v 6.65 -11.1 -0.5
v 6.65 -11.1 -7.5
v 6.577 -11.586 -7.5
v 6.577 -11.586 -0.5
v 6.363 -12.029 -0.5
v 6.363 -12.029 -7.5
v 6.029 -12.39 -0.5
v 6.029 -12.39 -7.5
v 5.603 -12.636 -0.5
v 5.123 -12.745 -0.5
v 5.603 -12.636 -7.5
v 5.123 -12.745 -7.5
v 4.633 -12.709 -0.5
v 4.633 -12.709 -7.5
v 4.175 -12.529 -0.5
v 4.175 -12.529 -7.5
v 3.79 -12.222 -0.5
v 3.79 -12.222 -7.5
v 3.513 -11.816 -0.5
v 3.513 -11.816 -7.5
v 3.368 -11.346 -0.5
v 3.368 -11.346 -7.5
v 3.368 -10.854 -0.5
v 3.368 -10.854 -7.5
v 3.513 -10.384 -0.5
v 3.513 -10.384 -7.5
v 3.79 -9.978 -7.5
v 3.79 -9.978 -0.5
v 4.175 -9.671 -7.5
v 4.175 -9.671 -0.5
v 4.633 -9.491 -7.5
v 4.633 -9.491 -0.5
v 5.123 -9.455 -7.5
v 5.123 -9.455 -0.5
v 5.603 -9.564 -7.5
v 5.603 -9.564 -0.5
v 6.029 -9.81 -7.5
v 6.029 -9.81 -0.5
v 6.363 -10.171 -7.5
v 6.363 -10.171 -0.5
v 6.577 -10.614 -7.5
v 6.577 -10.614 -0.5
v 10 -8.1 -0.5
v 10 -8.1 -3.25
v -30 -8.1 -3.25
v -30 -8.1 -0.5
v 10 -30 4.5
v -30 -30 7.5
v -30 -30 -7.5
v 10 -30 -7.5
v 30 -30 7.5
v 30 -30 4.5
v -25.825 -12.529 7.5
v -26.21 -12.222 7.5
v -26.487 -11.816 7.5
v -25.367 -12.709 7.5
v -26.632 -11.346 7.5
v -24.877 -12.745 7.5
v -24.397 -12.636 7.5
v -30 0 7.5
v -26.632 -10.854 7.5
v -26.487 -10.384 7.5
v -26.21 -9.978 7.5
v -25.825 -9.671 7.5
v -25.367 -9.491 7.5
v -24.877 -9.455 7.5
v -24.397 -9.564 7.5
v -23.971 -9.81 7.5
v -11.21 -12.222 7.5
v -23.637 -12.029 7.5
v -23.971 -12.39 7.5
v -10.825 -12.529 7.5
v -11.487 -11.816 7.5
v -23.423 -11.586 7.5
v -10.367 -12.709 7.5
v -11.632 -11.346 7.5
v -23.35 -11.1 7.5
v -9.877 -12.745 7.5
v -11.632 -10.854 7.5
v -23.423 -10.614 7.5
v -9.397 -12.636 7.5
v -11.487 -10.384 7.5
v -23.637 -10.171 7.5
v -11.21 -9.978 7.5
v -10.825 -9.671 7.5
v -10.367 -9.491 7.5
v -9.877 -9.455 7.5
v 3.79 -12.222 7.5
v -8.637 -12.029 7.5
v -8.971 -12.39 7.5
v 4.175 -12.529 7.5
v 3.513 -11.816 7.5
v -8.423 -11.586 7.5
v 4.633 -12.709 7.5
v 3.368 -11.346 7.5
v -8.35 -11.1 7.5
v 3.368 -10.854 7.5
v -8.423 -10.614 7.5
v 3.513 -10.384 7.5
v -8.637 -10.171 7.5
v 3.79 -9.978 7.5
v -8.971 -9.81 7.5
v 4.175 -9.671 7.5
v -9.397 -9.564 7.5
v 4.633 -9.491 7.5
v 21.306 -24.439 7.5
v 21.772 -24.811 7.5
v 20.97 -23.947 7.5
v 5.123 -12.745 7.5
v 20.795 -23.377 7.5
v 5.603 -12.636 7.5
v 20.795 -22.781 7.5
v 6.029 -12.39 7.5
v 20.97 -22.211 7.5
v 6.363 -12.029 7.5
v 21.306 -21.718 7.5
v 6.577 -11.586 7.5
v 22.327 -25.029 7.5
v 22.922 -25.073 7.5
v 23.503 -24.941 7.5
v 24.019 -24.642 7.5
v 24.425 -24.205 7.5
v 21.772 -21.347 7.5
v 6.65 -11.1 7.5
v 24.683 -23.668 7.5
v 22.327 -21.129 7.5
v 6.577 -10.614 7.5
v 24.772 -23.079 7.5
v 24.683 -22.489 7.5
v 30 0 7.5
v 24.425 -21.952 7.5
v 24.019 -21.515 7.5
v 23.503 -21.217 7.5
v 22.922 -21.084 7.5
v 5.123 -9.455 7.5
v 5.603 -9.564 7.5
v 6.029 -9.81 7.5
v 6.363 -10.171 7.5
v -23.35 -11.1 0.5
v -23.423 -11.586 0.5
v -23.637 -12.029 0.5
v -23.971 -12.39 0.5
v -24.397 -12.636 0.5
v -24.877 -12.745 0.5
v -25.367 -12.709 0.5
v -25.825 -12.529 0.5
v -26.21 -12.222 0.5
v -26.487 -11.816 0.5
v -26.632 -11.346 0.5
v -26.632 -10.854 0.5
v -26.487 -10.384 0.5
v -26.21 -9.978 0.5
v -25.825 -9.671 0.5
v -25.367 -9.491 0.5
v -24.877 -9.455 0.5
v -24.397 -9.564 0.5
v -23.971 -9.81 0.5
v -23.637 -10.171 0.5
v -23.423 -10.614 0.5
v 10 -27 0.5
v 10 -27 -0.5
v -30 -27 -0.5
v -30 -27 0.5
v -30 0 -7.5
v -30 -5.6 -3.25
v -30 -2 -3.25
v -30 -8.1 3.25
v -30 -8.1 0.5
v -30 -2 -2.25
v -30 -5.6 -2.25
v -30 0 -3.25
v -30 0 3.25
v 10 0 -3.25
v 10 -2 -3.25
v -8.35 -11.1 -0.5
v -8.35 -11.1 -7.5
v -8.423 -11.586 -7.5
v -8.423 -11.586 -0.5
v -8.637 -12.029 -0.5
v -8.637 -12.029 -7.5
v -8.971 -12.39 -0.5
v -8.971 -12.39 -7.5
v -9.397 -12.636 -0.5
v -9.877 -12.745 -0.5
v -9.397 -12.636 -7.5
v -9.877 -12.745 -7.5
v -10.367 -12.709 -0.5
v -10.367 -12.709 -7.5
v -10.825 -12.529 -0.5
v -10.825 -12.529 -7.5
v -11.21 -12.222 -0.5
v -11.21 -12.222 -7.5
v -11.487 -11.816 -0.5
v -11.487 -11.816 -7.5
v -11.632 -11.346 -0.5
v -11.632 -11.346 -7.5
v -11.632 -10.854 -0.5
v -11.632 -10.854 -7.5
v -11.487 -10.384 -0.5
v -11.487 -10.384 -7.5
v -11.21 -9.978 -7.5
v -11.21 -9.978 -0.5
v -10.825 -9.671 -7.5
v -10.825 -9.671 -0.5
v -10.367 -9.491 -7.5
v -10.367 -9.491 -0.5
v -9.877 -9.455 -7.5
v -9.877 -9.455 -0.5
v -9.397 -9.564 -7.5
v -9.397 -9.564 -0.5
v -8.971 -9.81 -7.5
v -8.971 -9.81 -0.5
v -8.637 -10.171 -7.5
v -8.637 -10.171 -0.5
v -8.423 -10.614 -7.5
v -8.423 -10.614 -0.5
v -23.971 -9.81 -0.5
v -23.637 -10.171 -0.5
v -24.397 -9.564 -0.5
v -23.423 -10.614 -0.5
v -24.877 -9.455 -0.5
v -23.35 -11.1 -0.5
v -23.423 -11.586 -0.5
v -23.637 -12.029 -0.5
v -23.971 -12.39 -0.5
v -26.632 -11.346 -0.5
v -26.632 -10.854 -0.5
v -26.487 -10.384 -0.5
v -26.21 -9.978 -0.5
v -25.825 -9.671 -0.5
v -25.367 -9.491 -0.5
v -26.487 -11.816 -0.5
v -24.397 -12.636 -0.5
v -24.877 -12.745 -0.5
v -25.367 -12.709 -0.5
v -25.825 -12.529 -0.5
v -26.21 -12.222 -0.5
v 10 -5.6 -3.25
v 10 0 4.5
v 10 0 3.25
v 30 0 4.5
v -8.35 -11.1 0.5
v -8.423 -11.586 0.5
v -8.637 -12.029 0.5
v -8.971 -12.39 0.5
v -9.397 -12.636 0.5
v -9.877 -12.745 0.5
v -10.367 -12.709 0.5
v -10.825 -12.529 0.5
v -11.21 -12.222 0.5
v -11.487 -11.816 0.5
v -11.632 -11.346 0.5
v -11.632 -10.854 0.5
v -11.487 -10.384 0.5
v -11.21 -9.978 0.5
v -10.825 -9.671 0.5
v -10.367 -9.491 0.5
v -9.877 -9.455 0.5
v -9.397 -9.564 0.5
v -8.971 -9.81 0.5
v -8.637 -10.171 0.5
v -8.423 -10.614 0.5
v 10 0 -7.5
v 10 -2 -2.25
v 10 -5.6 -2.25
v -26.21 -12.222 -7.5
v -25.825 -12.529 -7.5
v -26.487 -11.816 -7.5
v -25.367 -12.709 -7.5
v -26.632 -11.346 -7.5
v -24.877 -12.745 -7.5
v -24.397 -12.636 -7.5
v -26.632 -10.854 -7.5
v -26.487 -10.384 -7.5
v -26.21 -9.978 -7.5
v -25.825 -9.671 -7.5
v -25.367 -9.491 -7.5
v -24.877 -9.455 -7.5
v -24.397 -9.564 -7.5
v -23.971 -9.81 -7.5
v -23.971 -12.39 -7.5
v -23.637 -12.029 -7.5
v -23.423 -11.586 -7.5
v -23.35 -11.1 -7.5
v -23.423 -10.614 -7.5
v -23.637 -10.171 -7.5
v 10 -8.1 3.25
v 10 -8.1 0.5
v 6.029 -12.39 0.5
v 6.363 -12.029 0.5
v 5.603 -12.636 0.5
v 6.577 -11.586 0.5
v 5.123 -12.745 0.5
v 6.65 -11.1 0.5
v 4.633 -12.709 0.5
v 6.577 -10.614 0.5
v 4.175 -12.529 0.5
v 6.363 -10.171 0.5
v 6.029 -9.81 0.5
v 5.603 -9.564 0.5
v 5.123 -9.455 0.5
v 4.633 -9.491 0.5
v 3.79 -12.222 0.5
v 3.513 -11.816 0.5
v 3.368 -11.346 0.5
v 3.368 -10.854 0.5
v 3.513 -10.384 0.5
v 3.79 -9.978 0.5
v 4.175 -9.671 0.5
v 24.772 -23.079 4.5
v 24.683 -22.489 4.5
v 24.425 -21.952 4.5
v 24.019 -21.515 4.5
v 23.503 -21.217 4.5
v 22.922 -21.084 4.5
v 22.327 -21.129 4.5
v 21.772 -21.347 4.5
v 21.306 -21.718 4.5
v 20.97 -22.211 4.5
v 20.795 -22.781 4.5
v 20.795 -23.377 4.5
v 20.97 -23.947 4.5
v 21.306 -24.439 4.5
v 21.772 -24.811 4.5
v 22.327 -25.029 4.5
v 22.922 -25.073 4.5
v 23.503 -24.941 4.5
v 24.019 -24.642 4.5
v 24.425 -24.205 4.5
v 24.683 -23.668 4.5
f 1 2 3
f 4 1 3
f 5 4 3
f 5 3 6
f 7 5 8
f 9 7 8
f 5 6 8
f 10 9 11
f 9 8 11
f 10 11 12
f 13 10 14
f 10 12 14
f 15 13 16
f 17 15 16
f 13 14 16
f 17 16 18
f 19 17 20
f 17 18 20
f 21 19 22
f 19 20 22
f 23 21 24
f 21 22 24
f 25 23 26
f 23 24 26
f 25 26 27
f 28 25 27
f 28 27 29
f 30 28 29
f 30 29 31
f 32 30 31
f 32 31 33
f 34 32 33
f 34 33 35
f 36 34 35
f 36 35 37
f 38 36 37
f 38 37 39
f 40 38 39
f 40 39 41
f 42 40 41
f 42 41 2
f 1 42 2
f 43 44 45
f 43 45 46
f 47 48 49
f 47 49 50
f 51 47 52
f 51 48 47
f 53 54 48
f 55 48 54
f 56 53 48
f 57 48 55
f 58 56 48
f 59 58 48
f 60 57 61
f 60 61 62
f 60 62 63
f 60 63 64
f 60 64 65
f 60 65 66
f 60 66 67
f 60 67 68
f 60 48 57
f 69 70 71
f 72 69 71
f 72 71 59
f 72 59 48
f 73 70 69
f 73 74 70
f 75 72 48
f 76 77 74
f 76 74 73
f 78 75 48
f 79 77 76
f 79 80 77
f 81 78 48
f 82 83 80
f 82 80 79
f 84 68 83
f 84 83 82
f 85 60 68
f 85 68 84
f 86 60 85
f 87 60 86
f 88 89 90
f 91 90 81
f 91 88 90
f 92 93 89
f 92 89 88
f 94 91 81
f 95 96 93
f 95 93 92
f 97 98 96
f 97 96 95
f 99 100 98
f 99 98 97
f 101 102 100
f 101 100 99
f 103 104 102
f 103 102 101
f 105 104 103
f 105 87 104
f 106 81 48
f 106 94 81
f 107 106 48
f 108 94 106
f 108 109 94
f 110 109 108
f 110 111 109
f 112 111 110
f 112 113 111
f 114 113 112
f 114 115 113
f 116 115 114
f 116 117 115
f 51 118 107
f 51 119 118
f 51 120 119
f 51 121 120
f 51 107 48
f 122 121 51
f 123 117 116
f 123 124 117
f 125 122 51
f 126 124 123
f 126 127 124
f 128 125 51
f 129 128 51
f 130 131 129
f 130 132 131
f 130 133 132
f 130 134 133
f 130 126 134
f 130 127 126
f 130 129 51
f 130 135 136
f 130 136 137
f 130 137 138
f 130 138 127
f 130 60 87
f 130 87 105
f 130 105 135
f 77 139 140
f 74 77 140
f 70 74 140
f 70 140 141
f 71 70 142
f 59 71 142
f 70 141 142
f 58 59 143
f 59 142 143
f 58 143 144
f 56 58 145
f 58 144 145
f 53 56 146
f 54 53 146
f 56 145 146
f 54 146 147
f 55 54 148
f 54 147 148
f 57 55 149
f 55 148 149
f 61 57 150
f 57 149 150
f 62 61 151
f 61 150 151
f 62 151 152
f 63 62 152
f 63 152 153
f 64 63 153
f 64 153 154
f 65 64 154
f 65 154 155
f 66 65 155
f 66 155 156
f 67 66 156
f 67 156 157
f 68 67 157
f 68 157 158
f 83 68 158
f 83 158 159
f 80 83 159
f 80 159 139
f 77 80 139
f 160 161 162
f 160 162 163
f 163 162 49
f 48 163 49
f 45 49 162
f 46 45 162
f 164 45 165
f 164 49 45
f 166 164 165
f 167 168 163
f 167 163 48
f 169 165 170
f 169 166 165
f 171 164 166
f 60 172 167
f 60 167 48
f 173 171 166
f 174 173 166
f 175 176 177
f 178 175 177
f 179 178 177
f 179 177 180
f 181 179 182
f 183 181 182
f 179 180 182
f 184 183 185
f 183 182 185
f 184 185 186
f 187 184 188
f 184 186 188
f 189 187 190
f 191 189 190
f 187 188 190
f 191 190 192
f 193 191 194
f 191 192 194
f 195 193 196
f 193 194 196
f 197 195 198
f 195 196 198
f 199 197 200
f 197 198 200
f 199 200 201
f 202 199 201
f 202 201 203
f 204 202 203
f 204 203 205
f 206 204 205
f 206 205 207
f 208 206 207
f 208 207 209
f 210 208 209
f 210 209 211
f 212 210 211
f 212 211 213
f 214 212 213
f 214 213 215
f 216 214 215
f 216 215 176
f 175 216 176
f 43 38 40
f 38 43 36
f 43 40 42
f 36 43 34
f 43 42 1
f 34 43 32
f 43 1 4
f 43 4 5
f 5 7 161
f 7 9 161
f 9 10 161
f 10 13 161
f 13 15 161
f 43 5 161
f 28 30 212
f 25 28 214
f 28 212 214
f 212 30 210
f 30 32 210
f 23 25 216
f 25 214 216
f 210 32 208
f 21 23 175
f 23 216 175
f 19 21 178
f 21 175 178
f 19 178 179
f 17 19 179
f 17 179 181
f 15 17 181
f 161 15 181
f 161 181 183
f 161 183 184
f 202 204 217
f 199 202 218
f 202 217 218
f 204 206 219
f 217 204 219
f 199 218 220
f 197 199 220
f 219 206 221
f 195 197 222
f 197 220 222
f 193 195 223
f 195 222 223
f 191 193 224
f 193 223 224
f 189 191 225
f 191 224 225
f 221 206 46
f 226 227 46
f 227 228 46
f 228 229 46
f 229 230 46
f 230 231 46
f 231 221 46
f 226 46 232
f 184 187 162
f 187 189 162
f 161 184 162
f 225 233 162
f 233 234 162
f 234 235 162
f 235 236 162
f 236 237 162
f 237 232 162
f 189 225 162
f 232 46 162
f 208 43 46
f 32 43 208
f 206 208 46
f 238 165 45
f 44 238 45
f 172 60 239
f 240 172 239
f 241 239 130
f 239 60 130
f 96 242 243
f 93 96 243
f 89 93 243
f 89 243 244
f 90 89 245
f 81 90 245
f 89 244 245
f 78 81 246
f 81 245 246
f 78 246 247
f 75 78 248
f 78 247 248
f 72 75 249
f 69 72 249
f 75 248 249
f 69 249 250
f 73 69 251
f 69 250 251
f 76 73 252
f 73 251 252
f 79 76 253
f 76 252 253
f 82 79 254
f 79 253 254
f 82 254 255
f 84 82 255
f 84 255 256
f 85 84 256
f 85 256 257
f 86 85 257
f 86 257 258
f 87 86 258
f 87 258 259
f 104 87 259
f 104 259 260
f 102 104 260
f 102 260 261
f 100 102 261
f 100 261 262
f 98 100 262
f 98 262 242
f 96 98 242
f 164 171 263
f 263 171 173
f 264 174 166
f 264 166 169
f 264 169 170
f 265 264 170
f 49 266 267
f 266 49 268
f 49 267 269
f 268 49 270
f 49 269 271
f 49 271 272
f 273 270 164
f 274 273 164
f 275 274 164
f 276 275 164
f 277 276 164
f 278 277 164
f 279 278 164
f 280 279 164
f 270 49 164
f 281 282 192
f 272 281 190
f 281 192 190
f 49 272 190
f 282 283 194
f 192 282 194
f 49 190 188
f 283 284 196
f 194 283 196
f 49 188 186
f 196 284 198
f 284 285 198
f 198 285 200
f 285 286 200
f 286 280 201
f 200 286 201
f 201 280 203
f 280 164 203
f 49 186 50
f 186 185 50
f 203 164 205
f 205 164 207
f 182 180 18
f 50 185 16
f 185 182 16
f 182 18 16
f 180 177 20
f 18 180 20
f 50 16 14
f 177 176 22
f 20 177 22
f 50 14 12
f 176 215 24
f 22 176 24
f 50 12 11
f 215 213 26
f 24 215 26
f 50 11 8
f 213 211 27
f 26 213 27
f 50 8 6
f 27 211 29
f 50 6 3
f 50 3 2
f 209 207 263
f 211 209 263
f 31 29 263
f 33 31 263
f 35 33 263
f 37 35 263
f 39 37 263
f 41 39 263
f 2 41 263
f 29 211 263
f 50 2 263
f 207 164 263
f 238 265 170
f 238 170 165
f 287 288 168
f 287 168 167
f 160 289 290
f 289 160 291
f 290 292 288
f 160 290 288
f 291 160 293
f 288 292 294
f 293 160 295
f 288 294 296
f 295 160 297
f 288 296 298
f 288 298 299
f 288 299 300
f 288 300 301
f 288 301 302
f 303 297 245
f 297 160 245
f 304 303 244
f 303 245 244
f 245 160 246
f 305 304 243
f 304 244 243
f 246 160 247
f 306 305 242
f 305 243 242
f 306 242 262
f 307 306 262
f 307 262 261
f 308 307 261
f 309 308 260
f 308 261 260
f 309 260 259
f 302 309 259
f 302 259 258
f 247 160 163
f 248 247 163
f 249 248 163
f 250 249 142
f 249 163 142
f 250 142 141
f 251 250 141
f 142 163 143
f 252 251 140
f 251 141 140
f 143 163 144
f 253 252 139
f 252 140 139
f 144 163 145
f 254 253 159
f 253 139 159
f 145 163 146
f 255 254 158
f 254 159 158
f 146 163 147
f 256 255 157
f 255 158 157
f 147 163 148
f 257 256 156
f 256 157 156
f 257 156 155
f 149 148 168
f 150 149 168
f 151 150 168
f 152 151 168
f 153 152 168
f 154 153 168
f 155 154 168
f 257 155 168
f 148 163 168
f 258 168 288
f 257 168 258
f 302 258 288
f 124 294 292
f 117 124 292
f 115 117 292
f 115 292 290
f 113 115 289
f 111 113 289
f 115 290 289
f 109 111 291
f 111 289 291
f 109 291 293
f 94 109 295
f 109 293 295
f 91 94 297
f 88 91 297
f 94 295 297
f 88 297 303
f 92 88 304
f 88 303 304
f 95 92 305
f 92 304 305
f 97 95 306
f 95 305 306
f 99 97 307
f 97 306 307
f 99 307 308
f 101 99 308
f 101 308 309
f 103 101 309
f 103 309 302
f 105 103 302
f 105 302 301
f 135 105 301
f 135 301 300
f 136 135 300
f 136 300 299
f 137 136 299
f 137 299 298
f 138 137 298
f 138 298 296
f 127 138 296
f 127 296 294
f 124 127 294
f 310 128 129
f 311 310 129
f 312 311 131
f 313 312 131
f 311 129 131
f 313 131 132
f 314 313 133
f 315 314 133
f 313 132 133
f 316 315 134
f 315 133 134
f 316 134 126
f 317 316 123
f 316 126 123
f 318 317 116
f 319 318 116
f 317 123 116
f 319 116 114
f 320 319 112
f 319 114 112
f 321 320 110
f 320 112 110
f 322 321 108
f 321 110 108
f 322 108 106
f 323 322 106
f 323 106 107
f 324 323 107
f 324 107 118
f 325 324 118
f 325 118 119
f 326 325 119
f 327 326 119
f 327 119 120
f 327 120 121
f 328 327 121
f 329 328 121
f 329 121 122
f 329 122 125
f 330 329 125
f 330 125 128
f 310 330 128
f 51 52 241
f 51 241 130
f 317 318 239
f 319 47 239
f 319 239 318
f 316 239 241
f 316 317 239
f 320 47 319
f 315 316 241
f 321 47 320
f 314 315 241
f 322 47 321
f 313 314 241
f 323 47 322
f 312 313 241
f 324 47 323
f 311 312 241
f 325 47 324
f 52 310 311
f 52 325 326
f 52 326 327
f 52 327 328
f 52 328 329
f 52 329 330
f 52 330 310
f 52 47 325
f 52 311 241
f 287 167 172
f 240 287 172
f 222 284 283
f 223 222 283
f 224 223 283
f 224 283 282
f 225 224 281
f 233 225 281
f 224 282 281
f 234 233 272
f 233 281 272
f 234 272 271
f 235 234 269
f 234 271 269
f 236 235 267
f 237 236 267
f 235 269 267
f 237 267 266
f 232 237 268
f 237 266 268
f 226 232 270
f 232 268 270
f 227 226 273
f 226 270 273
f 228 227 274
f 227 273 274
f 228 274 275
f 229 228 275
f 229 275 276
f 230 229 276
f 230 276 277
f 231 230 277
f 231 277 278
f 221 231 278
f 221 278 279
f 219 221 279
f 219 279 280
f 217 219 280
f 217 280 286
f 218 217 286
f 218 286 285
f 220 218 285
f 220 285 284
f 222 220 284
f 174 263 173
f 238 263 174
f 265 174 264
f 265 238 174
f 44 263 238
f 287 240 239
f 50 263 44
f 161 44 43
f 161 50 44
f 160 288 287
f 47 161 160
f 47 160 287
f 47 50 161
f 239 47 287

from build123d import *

# Parameters (mm, degrees)
F0_W     = 60
F0_H     = 15
F1_DEPTH = 30
F3_DEPTH = 60.001
F4_W     = 20
F4_H     = 12
F5_DEPTH = 30.001
F6_R     = 1.65
F7_DEPTH = 15.001
F8_R     = 2
F9_DEPTH = 15.001


with BuildPart() as f1:
    # F0 (on Front) → F1 (new body)
    with BuildSketch(Plane.XZ):
        Rectangle(F0_W, F0_H)
    extrude(amount=F1_DEPTH)

    # F2 (on face) → F3 (cut, through all)
    with BuildSketch(Plane(origin=(-30, 0, 0), x_dir=(0, -1, 0), z_dir=(-1, 0, 0))):
        Polygon((8.1, 3.25), (0, 3.25), (0, -3.25), (2, -3.25), (2, -2.25), (5.6, -2.25), (5.6, -3.25), (8.1, -3.25), (8.1, -0.5), (27, -0.5), (27, 0.5), (8.1, 0.5), align=None)
    extrude(amount=-F3_DEPTH, mode=Mode.SUBTRACT)

    # F4 (on face) → F5 (cut, through all)
    with BuildSketch(Plane.XZ.offset(30)):
        with Locations((20, -1.5)):
            Rectangle(F4_W, F4_H)
    extrude(amount=-F5_DEPTH, mode=Mode.SUBTRACT)

    # F6 (on face) → F7 (cut, through all)
    with BuildSketch(Plane(origin=(0, 0, -7.5), x_dir=(1, 0, 0), z_dir=(0, 0, -1))):
        with Locations((5, 11.1)):
            Circle(F6_R)
        with Locations((-25, 11.1)):
            Circle(F6_R)
        with Locations((-10, 11.1)):
            Circle(F6_R)
    extrude(amount=-F7_DEPTH, mode=Mode.SUBTRACT)

    # F8 (on face) → F9 (cut, through all)
    with BuildSketch(Plane.XY.offset(7.5)):
        with Locations((22.77234, -23.078762)):
            Circle(F8_R)
    extrude(amount=-F9_DEPTH, mode=Mode.SUBTRACT)


solid = f1.part
